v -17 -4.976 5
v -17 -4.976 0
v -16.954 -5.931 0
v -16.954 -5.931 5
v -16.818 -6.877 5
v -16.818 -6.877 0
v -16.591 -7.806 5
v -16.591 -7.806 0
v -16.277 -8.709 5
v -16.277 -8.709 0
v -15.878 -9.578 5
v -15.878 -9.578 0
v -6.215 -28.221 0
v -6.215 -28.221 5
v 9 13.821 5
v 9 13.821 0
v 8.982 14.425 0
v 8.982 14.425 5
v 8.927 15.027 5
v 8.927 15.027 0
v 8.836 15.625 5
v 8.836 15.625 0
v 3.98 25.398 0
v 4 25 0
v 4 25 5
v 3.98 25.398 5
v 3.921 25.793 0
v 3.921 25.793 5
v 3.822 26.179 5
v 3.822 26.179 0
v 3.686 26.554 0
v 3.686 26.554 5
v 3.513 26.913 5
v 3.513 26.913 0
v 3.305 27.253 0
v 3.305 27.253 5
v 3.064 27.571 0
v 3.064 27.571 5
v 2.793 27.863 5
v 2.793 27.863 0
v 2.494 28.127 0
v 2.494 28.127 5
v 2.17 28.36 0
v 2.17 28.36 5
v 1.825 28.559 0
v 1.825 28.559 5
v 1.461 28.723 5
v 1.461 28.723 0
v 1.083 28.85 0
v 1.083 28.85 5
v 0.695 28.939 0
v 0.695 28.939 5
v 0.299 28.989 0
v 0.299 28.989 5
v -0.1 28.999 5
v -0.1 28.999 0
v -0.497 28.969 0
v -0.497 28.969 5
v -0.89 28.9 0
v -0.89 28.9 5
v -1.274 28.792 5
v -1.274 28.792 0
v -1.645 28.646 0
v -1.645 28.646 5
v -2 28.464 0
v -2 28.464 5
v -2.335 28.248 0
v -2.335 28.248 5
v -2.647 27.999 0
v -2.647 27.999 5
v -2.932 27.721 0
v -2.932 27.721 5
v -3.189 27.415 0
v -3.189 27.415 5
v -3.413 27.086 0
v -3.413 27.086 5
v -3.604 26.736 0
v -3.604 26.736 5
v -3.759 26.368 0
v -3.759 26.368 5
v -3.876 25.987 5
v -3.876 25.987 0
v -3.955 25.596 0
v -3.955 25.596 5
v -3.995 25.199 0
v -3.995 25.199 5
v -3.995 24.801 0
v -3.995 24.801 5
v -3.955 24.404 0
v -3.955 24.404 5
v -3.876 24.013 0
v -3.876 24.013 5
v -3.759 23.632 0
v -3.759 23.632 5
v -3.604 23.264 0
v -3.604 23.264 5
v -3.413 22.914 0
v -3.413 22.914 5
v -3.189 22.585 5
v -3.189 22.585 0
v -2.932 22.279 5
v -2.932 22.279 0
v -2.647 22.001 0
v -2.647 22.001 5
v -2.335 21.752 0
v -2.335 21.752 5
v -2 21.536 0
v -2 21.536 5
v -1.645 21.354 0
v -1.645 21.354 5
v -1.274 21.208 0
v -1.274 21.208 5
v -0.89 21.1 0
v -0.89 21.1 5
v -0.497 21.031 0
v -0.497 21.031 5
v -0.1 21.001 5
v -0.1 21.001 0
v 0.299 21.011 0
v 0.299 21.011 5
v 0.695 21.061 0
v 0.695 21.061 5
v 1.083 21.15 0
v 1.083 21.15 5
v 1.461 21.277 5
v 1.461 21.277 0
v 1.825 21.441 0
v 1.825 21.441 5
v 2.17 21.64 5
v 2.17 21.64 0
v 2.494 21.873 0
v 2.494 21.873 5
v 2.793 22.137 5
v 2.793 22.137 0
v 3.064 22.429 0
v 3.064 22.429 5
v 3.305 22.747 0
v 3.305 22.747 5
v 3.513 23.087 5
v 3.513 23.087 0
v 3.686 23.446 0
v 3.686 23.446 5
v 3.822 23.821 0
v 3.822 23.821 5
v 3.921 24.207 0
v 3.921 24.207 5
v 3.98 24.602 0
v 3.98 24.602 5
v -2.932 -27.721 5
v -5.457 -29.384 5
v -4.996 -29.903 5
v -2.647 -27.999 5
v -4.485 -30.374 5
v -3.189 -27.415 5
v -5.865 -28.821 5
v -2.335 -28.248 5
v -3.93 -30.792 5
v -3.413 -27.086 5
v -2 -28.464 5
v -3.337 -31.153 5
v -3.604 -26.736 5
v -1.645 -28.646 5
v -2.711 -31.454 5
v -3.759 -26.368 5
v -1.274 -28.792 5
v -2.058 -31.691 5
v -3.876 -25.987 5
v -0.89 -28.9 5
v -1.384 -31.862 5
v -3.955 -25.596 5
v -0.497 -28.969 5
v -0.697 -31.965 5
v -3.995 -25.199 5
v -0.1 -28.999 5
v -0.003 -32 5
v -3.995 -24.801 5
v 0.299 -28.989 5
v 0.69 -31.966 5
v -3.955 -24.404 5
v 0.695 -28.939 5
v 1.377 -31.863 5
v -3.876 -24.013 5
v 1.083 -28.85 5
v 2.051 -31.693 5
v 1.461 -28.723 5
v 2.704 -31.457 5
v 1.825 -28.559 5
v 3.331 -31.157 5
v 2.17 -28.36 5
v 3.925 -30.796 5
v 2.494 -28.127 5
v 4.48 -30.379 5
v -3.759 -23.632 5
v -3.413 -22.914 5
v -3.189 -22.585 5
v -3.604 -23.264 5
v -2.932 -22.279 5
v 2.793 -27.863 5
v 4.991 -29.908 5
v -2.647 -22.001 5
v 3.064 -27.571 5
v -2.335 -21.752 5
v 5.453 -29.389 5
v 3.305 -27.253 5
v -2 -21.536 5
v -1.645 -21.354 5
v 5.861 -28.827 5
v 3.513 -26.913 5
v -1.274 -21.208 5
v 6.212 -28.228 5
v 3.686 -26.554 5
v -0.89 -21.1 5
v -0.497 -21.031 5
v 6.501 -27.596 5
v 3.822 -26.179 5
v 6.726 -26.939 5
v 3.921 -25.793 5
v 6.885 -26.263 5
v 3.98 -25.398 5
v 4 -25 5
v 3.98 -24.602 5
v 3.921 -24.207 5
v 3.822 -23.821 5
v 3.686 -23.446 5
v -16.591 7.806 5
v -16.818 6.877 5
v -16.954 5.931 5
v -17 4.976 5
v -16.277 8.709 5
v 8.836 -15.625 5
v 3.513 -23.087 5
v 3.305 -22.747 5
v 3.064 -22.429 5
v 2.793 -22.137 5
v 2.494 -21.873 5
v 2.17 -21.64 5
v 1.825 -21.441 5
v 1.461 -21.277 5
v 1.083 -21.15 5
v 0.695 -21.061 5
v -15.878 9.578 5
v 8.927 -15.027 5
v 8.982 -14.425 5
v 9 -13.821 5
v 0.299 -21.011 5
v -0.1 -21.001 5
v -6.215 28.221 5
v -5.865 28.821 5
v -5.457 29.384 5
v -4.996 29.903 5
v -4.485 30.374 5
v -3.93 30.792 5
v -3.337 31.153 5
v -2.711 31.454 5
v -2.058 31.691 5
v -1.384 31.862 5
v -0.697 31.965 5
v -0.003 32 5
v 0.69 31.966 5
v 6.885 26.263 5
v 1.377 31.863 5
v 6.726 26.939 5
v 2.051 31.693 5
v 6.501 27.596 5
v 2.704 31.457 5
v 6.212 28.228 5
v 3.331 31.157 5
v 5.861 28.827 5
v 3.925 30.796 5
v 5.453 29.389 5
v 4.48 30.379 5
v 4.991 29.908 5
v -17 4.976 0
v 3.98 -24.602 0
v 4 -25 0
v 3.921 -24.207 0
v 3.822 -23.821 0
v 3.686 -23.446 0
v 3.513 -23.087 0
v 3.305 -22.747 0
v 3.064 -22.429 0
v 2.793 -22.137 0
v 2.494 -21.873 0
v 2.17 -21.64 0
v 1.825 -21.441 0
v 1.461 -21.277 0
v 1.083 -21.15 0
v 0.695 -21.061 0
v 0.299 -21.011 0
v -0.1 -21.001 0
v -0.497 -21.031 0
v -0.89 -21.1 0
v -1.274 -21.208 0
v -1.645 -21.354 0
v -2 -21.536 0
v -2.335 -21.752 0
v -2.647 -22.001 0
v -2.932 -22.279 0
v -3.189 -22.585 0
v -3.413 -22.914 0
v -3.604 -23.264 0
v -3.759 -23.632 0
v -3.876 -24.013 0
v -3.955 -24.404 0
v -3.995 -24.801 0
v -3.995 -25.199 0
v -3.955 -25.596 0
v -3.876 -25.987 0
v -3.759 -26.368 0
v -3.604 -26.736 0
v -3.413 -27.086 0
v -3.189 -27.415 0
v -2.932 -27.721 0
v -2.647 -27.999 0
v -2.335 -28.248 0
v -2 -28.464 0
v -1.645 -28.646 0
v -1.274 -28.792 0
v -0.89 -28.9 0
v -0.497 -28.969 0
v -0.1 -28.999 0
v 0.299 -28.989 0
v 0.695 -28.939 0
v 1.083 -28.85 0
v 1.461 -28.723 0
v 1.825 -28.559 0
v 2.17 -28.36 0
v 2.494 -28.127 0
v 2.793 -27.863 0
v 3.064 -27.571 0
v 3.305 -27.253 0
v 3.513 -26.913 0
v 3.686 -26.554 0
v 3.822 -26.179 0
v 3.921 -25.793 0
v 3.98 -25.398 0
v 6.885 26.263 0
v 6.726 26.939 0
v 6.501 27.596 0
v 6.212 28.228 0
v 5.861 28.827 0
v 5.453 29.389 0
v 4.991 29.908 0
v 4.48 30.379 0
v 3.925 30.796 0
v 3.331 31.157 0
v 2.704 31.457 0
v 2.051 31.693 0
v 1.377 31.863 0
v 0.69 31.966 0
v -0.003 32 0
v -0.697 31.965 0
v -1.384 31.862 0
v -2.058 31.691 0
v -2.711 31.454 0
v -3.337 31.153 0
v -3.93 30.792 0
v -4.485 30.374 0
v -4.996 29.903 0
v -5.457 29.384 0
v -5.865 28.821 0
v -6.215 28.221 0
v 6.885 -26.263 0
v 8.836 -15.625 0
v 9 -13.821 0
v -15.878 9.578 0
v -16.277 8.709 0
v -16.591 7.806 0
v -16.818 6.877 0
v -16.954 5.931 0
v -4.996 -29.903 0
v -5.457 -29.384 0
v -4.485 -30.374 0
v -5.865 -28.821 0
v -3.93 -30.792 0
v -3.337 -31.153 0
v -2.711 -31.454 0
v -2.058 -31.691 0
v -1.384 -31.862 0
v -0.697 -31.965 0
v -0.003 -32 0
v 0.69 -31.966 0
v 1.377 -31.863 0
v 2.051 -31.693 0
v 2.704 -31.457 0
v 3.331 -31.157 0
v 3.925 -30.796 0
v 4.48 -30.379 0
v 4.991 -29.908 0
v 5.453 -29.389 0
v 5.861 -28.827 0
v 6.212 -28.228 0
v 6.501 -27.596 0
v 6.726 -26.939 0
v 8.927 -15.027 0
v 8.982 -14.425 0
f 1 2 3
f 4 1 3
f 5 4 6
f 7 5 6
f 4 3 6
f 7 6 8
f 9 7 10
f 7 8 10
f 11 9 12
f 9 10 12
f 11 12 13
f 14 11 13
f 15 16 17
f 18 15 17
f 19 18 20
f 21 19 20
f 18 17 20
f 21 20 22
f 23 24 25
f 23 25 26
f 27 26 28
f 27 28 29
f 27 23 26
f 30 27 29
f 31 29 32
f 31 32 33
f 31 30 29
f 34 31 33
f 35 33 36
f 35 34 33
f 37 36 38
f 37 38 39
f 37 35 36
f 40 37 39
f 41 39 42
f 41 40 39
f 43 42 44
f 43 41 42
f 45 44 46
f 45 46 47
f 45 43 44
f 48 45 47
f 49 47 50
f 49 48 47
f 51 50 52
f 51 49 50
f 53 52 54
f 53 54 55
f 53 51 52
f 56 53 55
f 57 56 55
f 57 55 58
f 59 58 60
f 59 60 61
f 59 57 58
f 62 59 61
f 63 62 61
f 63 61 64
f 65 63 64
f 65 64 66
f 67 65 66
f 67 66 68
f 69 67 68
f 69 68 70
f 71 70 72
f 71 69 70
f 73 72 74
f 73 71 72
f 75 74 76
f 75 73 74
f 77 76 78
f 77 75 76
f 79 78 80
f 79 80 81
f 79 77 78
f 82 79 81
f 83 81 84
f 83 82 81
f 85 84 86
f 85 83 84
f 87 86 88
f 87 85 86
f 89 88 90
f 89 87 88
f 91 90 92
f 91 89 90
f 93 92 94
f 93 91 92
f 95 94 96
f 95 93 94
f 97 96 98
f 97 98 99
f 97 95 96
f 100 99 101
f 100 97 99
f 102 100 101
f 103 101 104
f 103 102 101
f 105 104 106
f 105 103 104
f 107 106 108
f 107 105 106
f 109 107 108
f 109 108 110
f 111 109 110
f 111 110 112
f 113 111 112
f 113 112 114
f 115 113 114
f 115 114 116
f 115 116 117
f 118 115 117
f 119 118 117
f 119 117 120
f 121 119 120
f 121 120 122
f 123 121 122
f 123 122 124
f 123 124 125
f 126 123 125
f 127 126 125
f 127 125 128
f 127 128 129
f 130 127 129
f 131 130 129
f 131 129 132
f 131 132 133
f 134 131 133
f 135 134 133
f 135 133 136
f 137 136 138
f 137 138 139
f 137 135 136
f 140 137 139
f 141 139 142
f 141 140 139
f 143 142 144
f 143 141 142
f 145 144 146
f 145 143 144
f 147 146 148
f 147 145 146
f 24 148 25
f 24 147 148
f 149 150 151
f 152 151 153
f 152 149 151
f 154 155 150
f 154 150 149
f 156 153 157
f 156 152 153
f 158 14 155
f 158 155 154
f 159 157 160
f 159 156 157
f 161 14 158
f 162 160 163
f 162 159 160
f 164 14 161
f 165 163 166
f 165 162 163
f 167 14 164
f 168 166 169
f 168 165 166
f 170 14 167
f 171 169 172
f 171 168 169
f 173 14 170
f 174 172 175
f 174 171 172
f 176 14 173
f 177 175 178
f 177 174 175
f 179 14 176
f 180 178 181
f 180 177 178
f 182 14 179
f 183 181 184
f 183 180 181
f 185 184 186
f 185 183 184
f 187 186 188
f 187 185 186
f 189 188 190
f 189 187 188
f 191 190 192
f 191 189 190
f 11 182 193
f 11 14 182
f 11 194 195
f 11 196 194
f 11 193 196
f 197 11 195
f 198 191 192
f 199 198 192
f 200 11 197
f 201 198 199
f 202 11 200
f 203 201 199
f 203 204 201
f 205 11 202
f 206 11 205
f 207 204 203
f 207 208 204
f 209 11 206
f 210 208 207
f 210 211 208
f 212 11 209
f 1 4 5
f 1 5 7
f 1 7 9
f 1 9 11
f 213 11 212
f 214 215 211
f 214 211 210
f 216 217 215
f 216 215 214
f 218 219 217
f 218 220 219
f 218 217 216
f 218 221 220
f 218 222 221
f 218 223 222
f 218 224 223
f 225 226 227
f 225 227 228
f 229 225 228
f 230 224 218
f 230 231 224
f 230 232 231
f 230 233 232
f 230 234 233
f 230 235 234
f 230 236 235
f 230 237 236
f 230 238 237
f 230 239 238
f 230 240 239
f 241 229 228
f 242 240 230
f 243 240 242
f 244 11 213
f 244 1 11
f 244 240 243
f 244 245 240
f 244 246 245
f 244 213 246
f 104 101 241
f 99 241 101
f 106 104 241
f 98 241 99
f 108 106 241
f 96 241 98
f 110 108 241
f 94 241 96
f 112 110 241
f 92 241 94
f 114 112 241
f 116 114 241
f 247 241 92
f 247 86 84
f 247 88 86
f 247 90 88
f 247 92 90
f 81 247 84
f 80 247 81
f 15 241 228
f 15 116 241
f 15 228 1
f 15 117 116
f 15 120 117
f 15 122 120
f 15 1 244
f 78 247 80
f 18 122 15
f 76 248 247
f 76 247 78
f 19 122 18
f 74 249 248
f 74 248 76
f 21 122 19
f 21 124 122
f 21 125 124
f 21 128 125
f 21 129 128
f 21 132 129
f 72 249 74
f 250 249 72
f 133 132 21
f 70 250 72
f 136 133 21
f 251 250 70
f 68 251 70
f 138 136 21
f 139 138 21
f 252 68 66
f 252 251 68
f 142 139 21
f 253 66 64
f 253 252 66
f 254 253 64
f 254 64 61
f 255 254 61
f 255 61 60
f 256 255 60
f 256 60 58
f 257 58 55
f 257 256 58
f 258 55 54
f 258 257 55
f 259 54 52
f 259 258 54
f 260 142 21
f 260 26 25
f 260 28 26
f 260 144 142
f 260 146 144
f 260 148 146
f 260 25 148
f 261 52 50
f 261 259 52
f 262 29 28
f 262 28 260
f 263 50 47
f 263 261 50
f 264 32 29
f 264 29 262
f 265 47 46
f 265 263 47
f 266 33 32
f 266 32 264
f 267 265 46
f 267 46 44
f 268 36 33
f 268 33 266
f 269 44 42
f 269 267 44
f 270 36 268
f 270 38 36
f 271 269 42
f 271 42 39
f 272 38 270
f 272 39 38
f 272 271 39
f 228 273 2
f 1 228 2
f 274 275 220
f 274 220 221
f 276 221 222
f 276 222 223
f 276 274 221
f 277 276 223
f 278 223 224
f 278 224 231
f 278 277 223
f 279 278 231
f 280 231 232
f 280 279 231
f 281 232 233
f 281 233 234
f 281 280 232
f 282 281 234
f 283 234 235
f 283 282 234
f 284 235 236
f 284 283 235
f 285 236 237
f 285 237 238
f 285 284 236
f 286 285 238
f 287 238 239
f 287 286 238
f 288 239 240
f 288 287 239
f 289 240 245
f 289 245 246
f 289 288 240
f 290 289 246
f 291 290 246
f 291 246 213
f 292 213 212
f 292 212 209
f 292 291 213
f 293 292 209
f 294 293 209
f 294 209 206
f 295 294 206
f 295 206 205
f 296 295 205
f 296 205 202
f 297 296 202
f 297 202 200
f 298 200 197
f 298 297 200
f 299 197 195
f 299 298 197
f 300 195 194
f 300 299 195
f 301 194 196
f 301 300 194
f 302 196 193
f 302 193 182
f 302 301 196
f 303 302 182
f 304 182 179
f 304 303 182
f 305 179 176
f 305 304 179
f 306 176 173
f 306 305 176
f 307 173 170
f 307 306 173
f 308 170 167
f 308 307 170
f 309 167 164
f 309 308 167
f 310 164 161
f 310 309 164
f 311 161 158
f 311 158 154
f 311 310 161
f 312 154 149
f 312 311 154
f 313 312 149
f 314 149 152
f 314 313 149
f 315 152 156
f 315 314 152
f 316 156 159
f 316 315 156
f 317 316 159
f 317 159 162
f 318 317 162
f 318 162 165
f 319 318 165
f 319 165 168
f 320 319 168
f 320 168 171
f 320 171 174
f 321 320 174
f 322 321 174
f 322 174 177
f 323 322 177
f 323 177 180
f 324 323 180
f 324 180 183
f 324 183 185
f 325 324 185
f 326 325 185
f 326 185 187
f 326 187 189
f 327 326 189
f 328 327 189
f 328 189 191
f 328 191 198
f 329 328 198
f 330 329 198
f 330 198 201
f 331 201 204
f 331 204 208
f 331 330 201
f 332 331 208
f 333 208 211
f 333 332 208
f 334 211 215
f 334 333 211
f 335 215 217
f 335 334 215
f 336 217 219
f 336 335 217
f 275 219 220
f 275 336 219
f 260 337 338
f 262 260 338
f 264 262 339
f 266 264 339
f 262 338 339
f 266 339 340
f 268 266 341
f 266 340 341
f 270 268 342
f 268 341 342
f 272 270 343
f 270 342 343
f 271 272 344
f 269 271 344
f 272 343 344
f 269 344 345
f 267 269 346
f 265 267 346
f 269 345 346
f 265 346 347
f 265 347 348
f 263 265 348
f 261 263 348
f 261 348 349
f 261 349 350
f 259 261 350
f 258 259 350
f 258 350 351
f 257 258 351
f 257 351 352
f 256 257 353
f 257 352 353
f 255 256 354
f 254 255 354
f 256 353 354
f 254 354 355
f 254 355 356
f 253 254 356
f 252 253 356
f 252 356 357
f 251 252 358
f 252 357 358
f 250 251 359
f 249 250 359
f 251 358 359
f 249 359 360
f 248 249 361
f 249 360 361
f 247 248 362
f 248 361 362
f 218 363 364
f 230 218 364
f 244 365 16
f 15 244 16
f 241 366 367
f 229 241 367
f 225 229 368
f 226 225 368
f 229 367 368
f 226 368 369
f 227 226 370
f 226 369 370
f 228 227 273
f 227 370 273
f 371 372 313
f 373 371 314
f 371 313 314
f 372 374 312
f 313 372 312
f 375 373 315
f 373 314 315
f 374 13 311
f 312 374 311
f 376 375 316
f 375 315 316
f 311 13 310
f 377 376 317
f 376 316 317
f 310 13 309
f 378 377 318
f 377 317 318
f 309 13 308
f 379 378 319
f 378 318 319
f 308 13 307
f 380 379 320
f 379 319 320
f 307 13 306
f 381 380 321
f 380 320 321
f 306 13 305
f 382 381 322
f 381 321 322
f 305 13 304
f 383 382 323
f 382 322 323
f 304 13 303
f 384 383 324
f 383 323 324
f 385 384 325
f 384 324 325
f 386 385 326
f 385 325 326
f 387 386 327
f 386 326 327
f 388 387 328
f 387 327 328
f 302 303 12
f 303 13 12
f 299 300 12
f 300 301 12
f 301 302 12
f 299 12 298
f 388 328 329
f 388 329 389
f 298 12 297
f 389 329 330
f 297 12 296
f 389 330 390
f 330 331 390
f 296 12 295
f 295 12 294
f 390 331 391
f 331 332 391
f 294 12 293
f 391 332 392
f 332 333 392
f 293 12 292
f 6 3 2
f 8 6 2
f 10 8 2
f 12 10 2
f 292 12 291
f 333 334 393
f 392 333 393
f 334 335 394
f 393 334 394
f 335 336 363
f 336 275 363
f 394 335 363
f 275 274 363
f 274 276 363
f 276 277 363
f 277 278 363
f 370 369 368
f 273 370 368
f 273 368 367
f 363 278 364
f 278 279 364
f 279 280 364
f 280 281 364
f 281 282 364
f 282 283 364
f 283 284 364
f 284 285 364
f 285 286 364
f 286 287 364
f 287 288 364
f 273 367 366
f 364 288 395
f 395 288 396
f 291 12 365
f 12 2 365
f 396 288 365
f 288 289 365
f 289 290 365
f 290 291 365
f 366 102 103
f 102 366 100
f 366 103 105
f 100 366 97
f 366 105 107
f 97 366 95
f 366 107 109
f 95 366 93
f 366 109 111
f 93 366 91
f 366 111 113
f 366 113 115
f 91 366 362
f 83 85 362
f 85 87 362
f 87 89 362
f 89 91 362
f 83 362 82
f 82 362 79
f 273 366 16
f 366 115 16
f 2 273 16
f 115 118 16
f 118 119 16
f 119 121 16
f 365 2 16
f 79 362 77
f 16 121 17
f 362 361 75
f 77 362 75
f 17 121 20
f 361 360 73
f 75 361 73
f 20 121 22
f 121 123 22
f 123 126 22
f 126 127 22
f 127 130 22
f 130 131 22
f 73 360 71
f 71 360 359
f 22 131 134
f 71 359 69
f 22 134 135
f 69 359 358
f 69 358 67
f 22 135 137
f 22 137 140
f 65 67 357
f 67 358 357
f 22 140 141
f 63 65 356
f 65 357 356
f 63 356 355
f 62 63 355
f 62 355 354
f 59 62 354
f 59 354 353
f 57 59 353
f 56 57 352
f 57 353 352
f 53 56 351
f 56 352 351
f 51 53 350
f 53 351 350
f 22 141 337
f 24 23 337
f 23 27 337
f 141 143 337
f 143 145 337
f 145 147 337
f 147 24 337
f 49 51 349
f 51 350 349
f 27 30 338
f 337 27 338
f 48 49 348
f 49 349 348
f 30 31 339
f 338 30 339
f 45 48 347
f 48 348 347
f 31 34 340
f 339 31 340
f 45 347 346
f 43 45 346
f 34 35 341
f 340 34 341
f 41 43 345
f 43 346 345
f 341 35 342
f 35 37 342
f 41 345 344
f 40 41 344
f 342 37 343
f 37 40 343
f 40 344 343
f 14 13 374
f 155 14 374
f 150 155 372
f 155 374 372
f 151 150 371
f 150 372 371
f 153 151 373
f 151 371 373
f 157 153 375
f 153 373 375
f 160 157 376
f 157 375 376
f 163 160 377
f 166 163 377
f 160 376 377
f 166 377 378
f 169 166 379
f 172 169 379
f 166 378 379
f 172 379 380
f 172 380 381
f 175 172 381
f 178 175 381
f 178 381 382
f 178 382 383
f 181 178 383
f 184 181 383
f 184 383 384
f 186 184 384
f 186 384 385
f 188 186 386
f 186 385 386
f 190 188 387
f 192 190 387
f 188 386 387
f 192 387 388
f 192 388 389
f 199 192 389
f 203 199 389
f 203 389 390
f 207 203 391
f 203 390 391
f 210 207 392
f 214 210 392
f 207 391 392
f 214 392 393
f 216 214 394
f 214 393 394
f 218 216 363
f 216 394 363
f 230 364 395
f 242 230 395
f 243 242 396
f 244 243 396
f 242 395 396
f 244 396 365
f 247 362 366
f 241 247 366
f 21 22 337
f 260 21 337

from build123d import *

# Parameters (mm, degrees)
SKETCH1_R           = 4
BOSS_EXTRUDE1_DEPTH = 5


with BuildPart() as part:
    # Sketch1 → Boss-Extrude1 (new body)
    # profile 1 of 11: a face of its own
    with BuildSketch(Plane.XY):
        with BuildLine():
            ThreePointArc((7, 25), (-1.657831686, 18.199147546), (-6.214741171, 28.221333912))
            Line((-6.214741171, 28.221333912), (-15.878201673, 9.578154573))
            ThreePointArc((-15.878201673, 9.578154573), (-16.715503506, 7.344579965), (-17, 4.976248984))
            Line((-17, 4.976248984), (-17, -4.976248984))
            ThreePointArc((-17, -4.976248984), (-16.715503506, -7.344579965), (-15.878201673, -9.578154573))
            Line((-15.878201673, -9.578154573), (-6.214741171, -28.221333912))
            ThreePointArc((-6.214741171, -28.221333912), (-1.657831686, -18.199147546), (7, -25))
            ThreePointArc((7, -25), (6.97123748, -25.633914815), (6.885186288, -26.262620205))
            Line((6.885186288, -26.262620205), (8.835980411, -15.624757058))
            ThreePointArc((8.835980411, -15.624757058), (8.958910686, -14.7266065), (9, -13.821013908))
            Line((9, -13.821013908), (9, 13.821013908))
            ThreePointArc((9, 13.821013908), (8.958910686, 14.7266065), (8.835980411, 15.624757058))
            Line((8.835980411, 15.624757058), (6.885186288, 26.262620205))
            ThreePointArc((6.885186288, 26.262620205), (6.97123748, 25.633914815), (7, 25))
        make_face()
    # profile 2 of 11: a face of its own
    with BuildSketch(Plane.XY):
        with BuildLine():
            ThreePointArc((6.885186288, 26.262620205), (1.035139609, 31.923040227), (-6.214741171, 28.221333912))
            ThreePointArc((-6.214741171, 28.221333912), (-1.657831686, 18.199147546), (7, 25))
            ThreePointArc((7, 25), (6.97123748, 25.633914815), (6.885186288, 26.262620205))
        make_face()
        with Locations((0, 25)):
            Circle(SKETCH1_R, mode=Mode.SUBTRACT)
    # profile 3 of 11: a face of its own
    with BuildSketch(Plane.XY):
        with BuildLine():
            ThreePointArc((6.885186288, 26.262620205), (1.035139609, 31.923040227), (-6.214741171, 28.221333912))
            ThreePointArc((-6.214741171, 28.221333912), (-1.657831686, 18.199147546), (7, 25))
            ThreePointArc((7, 25), (6.97123748, 25.633914815), (6.885186288, 26.262620205))
        make_face()
        with Locations((0, 25)):
            Circle(SKETCH1_R, mode=Mode.SUBTRACT)
    # profile 4 of 11: a face of its own
    with BuildSketch(Plane.XY):
        with BuildLine():
            ThreePointArc((6.885186288, 26.262620205), (1.035139609, 31.923040227), (-6.214741171, 28.221333912))
            ThreePointArc((-6.214741171, 28.221333912), (-1.657831686, 18.199147546), (7, 25))
            ThreePointArc((7, 25), (6.97123748, 25.633914815), (6.885186288, 26.262620205))
        make_face()
        with Locations((0, 25)):
            Circle(SKETCH1_R, mode=Mode.SUBTRACT)
    # profile 5 of 11: a face of its own
    with BuildSketch(Plane.XY):
        with BuildLine():
            ThreePointArc((6.885186288, 26.262620205), (1.035139609, 31.923040227), (-6.214741171, 28.221333912))
            ThreePointArc((-6.214741171, 28.221333912), (-1.657831686, 18.199147546), (7, 25))
            ThreePointArc((7, 25), (6.97123748, 25.633914815), (6.885186288, 26.262620205))
        make_face()
        with Locations((0, 25)):
            Circle(SKETCH1_R, mode=Mode.SUBTRACT)
    # profile 6 of 11: a face of its own
    with BuildSketch(Plane.XY):
        with BuildLine():
            ThreePointArc((6.885186288, 26.262620205), (1.035139609, 31.923040227), (-6.214741171, 28.221333912))
            ThreePointArc((-6.214741171, 28.221333912), (-1.657831686, 18.199147546), (7, 25))
            ThreePointArc((7, 25), (6.97123748, 25.633914815), (6.885186288, 26.262620205))
        make_face()
        with Locations((0, 25)):
            Circle(SKETCH1_R, mode=Mode.SUBTRACT)
    # profile 7 of 11: a face of its own
    with BuildSketch(Plane.XY):
        with BuildLine():
            ThreePointArc((7, -25), (-1.657831686, -18.199147546), (-6.214741171, -28.221333912))
            ThreePointArc((-6.214741171, -28.221333912), (1.035139609, -31.923040227), (6.885186288, -26.262620205))
            ThreePointArc((6.885186288, -26.262620205), (6.97123748, -25.633914815), (7, -25))
        make_face()
        with Locations((0, -25)):
            Circle(SKETCH1_R, mode=Mode.SUBTRACT)
    # profile 8 of 11: a face of its own
    with BuildSketch(Plane.XY):
        with BuildLine():
            ThreePointArc((7, -25), (-1.657831686, -18.199147546), (-6.214741171, -28.221333912))
            ThreePointArc((-6.214741171, -28.221333912), (1.035139609, -31.923040227), (6.885186288, -26.262620205))
            ThreePointArc((6.885186288, -26.262620205), (6.97123748, -25.633914815), (7, -25))
        make_face()
        with Locations((0, -25)):
            Circle(SKETCH1_R, mode=Mode.SUBTRACT)
    # profile 9 of 11: a face of its own
    with BuildSketch(Plane.XY):
        with BuildLine():
            ThreePointArc((7, -25), (-1.657831686, -18.199147546), (-6.214741171, -28.221333912))
            ThreePointArc((-6.214741171, -28.221333912), (1.035139609, -31.923040227), (6.885186288, -26.262620205))
            ThreePointArc((6.885186288, -26.262620205), (6.97123748, -25.633914815), (7, -25))
        make_face()
        with Locations((0, -25)):
            Circle(SKETCH1_R, mode=Mode.SUBTRACT)
    # profile 10 of 11: a face of its own
    with BuildSketch(Plane.XY):
        with BuildLine():
            ThreePointArc((7, -25), (-1.657831686, -18.199147546), (-6.214741171, -28.221333912))
            ThreePointArc((-6.214741171, -28.221333912), (1.035139609, -31.923040227), (6.885186288, -26.262620205))
            ThreePointArc((6.885186288, -26.262620205), (6.97123748, -25.633914815), (7, -25))
        make_face()
        with Locations((0, -25)):
            Circle(SKETCH1_R, mode=Mode.SUBTRACT)
    # profile 11 of 11: a face of its own
    with BuildSketch(Plane.XY):
        with BuildLine():
            ThreePointArc((7, -25), (-1.657831686, -18.199147546), (-6.214741171, -28.221333912))
            ThreePointArc((-6.214741171, -28.221333912), (1.035139609, -31.923040227), (6.885186288, -26.262620205))
            ThreePointArc((6.885186288, -26.262620205), (6.97123748, -25.633914815), (7, -25))
        make_face()
        with Locations((0, -25)):
            Circle(SKETCH1_R, mode=Mode.SUBTRACT)
    extrude(amount=BOSS_EXTRUDE1_DEPTH)


solid = part.part
